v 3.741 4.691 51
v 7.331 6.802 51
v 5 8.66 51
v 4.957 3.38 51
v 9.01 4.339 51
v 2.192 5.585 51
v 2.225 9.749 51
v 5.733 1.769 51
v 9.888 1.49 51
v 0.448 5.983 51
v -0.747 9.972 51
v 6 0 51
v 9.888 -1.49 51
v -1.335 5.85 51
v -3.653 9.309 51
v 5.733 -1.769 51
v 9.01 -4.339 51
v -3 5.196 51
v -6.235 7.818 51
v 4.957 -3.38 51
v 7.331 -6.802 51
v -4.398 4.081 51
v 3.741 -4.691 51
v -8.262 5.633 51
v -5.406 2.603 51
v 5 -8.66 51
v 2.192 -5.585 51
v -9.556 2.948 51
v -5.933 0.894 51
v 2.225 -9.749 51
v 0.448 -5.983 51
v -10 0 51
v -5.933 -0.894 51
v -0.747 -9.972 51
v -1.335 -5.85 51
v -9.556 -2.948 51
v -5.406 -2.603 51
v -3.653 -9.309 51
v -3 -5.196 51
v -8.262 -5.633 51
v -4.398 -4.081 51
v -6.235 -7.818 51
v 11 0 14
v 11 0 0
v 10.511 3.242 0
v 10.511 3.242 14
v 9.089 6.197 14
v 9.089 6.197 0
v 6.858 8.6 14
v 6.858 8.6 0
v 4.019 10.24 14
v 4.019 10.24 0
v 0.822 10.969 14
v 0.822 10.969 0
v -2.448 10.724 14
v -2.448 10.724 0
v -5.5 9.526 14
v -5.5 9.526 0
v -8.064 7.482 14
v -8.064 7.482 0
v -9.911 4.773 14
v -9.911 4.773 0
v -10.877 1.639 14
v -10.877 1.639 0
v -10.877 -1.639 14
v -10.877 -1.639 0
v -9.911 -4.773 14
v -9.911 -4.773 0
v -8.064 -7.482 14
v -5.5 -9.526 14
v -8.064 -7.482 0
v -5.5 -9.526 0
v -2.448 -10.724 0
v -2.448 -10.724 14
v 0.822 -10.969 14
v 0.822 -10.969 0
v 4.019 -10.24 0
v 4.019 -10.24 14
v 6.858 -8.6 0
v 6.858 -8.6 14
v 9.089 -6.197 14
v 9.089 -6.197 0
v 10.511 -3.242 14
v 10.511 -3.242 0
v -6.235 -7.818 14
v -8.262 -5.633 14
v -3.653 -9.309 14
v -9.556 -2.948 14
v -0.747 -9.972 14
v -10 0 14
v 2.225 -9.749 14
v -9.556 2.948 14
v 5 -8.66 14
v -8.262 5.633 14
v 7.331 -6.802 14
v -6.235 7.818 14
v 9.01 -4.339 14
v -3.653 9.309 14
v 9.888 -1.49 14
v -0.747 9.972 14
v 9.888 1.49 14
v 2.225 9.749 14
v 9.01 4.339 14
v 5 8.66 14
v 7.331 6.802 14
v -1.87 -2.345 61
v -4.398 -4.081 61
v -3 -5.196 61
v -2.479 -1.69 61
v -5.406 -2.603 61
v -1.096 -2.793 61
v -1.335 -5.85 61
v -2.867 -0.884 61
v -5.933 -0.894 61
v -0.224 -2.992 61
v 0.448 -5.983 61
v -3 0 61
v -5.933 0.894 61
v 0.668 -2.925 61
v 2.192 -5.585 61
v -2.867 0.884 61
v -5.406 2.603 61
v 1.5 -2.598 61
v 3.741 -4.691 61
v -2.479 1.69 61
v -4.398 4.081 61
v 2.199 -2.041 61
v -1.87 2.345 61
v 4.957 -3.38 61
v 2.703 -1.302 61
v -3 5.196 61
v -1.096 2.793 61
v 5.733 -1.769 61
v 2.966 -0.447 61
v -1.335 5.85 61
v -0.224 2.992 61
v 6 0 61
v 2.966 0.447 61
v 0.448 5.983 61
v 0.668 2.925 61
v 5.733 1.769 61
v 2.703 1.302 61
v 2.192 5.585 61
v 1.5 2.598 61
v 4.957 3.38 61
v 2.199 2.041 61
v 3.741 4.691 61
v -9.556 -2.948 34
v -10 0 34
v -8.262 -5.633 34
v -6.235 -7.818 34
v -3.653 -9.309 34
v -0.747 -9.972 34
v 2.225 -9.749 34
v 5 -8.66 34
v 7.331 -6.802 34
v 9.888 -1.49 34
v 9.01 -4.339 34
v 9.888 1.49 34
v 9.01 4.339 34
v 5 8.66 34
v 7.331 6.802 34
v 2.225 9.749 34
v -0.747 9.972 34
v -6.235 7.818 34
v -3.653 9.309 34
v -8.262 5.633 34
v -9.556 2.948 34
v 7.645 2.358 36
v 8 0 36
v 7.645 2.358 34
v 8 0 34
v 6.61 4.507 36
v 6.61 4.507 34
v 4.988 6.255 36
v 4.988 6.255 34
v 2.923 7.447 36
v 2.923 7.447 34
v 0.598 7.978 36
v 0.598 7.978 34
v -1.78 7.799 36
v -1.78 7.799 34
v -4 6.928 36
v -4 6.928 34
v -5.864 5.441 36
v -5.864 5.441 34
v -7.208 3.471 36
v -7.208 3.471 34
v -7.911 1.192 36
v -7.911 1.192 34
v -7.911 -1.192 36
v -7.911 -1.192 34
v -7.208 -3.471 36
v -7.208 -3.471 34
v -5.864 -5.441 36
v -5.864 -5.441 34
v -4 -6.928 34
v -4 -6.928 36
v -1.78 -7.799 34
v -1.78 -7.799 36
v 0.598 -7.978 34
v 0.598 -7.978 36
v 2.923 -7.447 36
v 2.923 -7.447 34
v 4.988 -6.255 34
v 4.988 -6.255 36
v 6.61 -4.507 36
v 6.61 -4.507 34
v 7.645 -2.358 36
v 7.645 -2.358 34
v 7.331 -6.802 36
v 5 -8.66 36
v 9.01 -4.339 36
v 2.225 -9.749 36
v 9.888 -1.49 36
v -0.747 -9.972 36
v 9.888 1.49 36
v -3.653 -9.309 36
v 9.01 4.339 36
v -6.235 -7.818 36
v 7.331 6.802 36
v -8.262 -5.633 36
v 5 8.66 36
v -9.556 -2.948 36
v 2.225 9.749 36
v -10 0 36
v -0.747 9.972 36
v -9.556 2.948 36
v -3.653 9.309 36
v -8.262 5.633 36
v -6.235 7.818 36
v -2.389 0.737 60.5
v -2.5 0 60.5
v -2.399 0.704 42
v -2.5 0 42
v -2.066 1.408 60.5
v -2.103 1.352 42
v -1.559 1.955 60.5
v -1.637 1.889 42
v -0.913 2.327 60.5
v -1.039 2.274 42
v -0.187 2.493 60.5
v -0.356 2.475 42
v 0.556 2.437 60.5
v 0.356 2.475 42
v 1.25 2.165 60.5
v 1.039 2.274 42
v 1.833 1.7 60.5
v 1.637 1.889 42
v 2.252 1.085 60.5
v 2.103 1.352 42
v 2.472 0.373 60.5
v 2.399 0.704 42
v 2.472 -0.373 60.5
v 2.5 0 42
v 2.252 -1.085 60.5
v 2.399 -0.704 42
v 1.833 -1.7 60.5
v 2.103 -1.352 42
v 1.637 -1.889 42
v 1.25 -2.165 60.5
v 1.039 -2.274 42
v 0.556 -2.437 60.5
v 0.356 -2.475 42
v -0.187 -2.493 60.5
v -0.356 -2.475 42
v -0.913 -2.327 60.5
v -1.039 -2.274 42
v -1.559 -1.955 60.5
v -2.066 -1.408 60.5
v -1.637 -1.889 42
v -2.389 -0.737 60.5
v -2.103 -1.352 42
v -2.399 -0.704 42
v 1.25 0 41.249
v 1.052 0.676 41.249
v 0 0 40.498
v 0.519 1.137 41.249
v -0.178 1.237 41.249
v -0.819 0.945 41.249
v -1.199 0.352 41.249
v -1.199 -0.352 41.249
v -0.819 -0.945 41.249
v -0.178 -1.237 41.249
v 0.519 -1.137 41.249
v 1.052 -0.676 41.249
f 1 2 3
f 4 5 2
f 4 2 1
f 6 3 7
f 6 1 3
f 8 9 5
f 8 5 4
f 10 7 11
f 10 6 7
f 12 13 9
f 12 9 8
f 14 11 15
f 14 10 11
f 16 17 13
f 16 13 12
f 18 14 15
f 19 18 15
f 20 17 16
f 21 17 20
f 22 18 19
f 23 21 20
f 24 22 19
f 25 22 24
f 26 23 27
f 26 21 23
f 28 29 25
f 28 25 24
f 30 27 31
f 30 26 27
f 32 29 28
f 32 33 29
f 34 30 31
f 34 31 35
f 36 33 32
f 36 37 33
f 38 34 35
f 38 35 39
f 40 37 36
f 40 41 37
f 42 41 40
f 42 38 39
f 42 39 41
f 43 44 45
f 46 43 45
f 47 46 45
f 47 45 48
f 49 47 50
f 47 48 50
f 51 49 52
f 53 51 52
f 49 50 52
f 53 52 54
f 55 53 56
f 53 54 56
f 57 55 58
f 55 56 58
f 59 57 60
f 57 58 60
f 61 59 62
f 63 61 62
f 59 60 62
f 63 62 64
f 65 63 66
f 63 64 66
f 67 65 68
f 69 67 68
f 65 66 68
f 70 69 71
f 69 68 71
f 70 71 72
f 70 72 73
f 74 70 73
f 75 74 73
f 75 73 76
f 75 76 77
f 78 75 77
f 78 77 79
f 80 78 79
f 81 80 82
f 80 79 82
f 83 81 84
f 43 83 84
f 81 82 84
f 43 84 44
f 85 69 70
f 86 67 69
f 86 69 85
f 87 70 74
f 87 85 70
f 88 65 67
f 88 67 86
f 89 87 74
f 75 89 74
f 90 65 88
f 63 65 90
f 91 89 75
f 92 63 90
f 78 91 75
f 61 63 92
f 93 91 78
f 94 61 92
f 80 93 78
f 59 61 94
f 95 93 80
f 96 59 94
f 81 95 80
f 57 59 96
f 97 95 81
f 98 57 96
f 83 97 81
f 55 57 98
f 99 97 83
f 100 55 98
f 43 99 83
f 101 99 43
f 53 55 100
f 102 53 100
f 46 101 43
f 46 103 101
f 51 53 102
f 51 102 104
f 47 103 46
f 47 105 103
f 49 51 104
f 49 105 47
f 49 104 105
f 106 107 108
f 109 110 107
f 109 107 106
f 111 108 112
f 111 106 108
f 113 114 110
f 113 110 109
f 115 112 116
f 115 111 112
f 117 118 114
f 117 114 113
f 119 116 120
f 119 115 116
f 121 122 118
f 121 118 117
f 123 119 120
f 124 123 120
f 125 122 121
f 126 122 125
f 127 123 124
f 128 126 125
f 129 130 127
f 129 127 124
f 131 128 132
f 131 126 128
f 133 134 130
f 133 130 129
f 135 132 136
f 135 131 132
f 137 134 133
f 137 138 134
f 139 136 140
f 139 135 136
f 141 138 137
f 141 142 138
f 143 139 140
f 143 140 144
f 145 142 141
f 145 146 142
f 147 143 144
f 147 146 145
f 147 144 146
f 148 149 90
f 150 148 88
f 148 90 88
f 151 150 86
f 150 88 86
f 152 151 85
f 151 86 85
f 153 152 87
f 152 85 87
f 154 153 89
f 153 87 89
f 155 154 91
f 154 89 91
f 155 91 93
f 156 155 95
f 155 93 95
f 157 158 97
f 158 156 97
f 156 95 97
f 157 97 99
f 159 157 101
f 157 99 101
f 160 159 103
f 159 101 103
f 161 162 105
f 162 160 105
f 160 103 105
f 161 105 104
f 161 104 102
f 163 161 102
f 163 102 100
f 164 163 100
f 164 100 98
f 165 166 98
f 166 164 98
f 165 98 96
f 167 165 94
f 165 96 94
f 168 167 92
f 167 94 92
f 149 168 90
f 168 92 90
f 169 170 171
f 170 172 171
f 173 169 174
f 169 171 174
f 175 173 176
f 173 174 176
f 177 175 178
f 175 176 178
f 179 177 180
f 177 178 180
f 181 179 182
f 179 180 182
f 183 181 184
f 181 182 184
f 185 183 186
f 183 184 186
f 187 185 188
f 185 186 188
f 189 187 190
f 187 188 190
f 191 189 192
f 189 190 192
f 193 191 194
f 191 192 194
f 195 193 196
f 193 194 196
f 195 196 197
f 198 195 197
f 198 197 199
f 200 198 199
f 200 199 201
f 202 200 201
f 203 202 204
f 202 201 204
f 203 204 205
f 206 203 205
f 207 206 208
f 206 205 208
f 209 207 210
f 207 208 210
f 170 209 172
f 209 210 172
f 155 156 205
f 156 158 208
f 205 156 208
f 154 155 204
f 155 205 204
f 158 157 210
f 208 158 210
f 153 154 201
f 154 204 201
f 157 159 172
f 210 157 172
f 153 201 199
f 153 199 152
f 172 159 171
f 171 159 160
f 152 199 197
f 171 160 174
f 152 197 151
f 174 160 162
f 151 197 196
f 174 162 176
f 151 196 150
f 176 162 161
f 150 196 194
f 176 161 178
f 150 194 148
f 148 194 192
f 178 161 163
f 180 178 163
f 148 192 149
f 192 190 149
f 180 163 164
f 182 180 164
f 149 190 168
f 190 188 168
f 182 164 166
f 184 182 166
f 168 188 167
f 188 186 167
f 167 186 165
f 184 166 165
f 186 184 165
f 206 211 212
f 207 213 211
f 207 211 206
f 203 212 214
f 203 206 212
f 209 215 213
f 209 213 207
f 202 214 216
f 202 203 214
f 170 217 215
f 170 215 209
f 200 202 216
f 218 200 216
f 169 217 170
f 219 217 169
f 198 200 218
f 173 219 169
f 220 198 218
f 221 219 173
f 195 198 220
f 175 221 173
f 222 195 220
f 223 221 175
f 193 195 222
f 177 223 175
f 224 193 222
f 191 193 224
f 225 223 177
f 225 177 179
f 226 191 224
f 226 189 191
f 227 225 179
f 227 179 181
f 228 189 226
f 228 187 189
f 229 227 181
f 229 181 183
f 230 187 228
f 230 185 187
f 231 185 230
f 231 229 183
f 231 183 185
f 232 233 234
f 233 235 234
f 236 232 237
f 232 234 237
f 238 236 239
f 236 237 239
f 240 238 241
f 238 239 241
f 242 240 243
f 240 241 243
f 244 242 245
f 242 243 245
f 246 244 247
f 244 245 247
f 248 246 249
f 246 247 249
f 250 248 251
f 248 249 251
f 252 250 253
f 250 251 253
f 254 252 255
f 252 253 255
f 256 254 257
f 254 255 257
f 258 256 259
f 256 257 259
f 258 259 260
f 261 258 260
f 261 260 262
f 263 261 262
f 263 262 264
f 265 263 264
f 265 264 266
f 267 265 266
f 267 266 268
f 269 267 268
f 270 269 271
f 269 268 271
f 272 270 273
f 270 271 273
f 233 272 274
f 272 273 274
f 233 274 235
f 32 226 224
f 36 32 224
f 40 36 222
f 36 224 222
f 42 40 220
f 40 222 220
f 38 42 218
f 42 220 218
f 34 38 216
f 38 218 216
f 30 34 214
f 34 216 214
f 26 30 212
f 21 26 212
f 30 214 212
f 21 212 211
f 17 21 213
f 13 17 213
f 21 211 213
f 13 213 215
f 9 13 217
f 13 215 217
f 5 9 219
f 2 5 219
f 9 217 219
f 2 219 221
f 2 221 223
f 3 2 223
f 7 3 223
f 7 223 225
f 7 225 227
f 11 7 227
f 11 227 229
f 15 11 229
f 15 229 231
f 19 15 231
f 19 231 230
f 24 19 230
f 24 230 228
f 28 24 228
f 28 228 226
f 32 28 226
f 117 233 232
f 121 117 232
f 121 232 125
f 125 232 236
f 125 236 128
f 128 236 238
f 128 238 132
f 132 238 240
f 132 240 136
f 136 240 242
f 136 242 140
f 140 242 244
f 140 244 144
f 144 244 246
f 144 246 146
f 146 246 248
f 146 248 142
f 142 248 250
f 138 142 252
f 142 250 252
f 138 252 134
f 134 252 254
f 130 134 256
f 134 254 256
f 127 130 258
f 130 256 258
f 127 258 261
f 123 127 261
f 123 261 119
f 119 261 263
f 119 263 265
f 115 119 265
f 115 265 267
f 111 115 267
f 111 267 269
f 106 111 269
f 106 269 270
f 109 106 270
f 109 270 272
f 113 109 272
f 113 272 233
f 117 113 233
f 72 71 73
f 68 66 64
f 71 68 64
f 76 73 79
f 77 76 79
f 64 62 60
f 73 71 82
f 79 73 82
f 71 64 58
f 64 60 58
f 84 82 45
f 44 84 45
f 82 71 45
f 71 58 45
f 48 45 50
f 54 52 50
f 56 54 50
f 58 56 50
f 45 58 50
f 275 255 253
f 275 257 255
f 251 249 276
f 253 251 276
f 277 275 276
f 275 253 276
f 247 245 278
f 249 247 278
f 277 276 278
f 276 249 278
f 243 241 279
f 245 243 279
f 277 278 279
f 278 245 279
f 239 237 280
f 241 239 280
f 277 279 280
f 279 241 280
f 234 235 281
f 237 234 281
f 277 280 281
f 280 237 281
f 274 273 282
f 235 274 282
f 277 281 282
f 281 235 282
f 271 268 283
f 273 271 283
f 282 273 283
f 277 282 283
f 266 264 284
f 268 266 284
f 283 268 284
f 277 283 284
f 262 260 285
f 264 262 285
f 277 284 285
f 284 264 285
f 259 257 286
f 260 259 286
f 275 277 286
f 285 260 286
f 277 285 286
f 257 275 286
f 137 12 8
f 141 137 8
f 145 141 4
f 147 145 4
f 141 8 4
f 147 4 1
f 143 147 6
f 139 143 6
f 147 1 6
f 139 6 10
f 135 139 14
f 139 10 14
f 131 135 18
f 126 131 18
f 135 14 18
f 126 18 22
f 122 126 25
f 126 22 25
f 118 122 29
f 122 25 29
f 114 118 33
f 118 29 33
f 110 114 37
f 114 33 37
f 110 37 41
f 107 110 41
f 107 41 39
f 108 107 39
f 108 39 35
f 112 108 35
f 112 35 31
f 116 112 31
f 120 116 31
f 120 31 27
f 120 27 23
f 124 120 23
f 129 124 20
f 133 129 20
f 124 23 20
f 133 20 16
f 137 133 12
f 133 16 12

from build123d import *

# Parameters (mm, degrees)
ESQUISSE1_R                     = 11
BASE_EXTRUSION_DEPTH            = 14
ESQUISSE2_R                     = 10
BOSS_EXTRU_1_DEPTH              = 37
ESQUISSE3_W                     = 2
ESQUISSE3_H                     = 2
ESQUISSE4_R                     = 6
BOSS_EXTRU_2_DEPTH              = 10
TROU_TARAUD_M6X1_01_D           = 5
TROU_TARAUD_M6X1_01_DEPTH       = 19
TROU_TARAUD_M6X1_01_CSINK_D     = 6
TROU_TARAUD_M6X1_01_CSINK_ANGLE = 90
TROU_TARAUD_M6X1_01_TIP         = 1.502151548


with BuildPart() as part:
    # Esquisse1 → Base-Extrusion (new body)
    with BuildSketch(Plane.XY):
        Circle(ESQUISSE1_R)
    extrude(amount=BASE_EXTRUSION_DEPTH)

    # Esquisse2 → Boss.-Extru.1 (add)
    with BuildSketch(Plane.XY.offset(14)):
        with Locations(Location((0, 0, 0), (0, 0, 180))):
            Circle(ESQUISSE2_R)
    extrude(amount=BOSS_EXTRU_1_DEPTH)

    # Esquisse3 → Enlèvement de matière-Révolution1 (revolve, cut)
    with BuildSketch(Plane(origin=(0, 0, 0), x_dir=(1, 0, 0), z_dir=(0, 1, 0))):
        with Locations((9, -35)):
            Rectangle(ESQUISSE3_W, ESQUISSE3_H)
    revolve(axis=Axis((0, 0, 0), (0, 0, 1)), mode=Mode.SUBTRACT)

    # Esquisse4 → Boss.-Extru.2 (add)
    with BuildSketch(Plane.XY.offset(51)):
        Circle(ESQUISSE4_R)
    extrude(amount=BOSS_EXTRU_2_DEPTH)

    # Trou taraudé M6x1.01
    with Locations(Plane.XY.offset(61)):
        with Locations((0, 0)):
            CounterSinkHole(TROU_TARAUD_M6X1_01_D / 2, TROU_TARAUD_M6X1_01_CSINK_D / 2, depth=TROU_TARAUD_M6X1_01_DEPTH, counter_sink_angle=TROU_TARAUD_M6X1_01_CSINK_ANGLE)
            with Locations((0, 0, -(TROU_TARAUD_M6X1_01_DEPTH + TROU_TARAUD_M6X1_01_TIP / 2))):  # 118° drill point
                Cone(0, TROU_TARAUD_M6X1_01_D / 2, TROU_TARAUD_M6X1_01_TIP, mode=Mode.SUBTRACT)


solid = part.part
